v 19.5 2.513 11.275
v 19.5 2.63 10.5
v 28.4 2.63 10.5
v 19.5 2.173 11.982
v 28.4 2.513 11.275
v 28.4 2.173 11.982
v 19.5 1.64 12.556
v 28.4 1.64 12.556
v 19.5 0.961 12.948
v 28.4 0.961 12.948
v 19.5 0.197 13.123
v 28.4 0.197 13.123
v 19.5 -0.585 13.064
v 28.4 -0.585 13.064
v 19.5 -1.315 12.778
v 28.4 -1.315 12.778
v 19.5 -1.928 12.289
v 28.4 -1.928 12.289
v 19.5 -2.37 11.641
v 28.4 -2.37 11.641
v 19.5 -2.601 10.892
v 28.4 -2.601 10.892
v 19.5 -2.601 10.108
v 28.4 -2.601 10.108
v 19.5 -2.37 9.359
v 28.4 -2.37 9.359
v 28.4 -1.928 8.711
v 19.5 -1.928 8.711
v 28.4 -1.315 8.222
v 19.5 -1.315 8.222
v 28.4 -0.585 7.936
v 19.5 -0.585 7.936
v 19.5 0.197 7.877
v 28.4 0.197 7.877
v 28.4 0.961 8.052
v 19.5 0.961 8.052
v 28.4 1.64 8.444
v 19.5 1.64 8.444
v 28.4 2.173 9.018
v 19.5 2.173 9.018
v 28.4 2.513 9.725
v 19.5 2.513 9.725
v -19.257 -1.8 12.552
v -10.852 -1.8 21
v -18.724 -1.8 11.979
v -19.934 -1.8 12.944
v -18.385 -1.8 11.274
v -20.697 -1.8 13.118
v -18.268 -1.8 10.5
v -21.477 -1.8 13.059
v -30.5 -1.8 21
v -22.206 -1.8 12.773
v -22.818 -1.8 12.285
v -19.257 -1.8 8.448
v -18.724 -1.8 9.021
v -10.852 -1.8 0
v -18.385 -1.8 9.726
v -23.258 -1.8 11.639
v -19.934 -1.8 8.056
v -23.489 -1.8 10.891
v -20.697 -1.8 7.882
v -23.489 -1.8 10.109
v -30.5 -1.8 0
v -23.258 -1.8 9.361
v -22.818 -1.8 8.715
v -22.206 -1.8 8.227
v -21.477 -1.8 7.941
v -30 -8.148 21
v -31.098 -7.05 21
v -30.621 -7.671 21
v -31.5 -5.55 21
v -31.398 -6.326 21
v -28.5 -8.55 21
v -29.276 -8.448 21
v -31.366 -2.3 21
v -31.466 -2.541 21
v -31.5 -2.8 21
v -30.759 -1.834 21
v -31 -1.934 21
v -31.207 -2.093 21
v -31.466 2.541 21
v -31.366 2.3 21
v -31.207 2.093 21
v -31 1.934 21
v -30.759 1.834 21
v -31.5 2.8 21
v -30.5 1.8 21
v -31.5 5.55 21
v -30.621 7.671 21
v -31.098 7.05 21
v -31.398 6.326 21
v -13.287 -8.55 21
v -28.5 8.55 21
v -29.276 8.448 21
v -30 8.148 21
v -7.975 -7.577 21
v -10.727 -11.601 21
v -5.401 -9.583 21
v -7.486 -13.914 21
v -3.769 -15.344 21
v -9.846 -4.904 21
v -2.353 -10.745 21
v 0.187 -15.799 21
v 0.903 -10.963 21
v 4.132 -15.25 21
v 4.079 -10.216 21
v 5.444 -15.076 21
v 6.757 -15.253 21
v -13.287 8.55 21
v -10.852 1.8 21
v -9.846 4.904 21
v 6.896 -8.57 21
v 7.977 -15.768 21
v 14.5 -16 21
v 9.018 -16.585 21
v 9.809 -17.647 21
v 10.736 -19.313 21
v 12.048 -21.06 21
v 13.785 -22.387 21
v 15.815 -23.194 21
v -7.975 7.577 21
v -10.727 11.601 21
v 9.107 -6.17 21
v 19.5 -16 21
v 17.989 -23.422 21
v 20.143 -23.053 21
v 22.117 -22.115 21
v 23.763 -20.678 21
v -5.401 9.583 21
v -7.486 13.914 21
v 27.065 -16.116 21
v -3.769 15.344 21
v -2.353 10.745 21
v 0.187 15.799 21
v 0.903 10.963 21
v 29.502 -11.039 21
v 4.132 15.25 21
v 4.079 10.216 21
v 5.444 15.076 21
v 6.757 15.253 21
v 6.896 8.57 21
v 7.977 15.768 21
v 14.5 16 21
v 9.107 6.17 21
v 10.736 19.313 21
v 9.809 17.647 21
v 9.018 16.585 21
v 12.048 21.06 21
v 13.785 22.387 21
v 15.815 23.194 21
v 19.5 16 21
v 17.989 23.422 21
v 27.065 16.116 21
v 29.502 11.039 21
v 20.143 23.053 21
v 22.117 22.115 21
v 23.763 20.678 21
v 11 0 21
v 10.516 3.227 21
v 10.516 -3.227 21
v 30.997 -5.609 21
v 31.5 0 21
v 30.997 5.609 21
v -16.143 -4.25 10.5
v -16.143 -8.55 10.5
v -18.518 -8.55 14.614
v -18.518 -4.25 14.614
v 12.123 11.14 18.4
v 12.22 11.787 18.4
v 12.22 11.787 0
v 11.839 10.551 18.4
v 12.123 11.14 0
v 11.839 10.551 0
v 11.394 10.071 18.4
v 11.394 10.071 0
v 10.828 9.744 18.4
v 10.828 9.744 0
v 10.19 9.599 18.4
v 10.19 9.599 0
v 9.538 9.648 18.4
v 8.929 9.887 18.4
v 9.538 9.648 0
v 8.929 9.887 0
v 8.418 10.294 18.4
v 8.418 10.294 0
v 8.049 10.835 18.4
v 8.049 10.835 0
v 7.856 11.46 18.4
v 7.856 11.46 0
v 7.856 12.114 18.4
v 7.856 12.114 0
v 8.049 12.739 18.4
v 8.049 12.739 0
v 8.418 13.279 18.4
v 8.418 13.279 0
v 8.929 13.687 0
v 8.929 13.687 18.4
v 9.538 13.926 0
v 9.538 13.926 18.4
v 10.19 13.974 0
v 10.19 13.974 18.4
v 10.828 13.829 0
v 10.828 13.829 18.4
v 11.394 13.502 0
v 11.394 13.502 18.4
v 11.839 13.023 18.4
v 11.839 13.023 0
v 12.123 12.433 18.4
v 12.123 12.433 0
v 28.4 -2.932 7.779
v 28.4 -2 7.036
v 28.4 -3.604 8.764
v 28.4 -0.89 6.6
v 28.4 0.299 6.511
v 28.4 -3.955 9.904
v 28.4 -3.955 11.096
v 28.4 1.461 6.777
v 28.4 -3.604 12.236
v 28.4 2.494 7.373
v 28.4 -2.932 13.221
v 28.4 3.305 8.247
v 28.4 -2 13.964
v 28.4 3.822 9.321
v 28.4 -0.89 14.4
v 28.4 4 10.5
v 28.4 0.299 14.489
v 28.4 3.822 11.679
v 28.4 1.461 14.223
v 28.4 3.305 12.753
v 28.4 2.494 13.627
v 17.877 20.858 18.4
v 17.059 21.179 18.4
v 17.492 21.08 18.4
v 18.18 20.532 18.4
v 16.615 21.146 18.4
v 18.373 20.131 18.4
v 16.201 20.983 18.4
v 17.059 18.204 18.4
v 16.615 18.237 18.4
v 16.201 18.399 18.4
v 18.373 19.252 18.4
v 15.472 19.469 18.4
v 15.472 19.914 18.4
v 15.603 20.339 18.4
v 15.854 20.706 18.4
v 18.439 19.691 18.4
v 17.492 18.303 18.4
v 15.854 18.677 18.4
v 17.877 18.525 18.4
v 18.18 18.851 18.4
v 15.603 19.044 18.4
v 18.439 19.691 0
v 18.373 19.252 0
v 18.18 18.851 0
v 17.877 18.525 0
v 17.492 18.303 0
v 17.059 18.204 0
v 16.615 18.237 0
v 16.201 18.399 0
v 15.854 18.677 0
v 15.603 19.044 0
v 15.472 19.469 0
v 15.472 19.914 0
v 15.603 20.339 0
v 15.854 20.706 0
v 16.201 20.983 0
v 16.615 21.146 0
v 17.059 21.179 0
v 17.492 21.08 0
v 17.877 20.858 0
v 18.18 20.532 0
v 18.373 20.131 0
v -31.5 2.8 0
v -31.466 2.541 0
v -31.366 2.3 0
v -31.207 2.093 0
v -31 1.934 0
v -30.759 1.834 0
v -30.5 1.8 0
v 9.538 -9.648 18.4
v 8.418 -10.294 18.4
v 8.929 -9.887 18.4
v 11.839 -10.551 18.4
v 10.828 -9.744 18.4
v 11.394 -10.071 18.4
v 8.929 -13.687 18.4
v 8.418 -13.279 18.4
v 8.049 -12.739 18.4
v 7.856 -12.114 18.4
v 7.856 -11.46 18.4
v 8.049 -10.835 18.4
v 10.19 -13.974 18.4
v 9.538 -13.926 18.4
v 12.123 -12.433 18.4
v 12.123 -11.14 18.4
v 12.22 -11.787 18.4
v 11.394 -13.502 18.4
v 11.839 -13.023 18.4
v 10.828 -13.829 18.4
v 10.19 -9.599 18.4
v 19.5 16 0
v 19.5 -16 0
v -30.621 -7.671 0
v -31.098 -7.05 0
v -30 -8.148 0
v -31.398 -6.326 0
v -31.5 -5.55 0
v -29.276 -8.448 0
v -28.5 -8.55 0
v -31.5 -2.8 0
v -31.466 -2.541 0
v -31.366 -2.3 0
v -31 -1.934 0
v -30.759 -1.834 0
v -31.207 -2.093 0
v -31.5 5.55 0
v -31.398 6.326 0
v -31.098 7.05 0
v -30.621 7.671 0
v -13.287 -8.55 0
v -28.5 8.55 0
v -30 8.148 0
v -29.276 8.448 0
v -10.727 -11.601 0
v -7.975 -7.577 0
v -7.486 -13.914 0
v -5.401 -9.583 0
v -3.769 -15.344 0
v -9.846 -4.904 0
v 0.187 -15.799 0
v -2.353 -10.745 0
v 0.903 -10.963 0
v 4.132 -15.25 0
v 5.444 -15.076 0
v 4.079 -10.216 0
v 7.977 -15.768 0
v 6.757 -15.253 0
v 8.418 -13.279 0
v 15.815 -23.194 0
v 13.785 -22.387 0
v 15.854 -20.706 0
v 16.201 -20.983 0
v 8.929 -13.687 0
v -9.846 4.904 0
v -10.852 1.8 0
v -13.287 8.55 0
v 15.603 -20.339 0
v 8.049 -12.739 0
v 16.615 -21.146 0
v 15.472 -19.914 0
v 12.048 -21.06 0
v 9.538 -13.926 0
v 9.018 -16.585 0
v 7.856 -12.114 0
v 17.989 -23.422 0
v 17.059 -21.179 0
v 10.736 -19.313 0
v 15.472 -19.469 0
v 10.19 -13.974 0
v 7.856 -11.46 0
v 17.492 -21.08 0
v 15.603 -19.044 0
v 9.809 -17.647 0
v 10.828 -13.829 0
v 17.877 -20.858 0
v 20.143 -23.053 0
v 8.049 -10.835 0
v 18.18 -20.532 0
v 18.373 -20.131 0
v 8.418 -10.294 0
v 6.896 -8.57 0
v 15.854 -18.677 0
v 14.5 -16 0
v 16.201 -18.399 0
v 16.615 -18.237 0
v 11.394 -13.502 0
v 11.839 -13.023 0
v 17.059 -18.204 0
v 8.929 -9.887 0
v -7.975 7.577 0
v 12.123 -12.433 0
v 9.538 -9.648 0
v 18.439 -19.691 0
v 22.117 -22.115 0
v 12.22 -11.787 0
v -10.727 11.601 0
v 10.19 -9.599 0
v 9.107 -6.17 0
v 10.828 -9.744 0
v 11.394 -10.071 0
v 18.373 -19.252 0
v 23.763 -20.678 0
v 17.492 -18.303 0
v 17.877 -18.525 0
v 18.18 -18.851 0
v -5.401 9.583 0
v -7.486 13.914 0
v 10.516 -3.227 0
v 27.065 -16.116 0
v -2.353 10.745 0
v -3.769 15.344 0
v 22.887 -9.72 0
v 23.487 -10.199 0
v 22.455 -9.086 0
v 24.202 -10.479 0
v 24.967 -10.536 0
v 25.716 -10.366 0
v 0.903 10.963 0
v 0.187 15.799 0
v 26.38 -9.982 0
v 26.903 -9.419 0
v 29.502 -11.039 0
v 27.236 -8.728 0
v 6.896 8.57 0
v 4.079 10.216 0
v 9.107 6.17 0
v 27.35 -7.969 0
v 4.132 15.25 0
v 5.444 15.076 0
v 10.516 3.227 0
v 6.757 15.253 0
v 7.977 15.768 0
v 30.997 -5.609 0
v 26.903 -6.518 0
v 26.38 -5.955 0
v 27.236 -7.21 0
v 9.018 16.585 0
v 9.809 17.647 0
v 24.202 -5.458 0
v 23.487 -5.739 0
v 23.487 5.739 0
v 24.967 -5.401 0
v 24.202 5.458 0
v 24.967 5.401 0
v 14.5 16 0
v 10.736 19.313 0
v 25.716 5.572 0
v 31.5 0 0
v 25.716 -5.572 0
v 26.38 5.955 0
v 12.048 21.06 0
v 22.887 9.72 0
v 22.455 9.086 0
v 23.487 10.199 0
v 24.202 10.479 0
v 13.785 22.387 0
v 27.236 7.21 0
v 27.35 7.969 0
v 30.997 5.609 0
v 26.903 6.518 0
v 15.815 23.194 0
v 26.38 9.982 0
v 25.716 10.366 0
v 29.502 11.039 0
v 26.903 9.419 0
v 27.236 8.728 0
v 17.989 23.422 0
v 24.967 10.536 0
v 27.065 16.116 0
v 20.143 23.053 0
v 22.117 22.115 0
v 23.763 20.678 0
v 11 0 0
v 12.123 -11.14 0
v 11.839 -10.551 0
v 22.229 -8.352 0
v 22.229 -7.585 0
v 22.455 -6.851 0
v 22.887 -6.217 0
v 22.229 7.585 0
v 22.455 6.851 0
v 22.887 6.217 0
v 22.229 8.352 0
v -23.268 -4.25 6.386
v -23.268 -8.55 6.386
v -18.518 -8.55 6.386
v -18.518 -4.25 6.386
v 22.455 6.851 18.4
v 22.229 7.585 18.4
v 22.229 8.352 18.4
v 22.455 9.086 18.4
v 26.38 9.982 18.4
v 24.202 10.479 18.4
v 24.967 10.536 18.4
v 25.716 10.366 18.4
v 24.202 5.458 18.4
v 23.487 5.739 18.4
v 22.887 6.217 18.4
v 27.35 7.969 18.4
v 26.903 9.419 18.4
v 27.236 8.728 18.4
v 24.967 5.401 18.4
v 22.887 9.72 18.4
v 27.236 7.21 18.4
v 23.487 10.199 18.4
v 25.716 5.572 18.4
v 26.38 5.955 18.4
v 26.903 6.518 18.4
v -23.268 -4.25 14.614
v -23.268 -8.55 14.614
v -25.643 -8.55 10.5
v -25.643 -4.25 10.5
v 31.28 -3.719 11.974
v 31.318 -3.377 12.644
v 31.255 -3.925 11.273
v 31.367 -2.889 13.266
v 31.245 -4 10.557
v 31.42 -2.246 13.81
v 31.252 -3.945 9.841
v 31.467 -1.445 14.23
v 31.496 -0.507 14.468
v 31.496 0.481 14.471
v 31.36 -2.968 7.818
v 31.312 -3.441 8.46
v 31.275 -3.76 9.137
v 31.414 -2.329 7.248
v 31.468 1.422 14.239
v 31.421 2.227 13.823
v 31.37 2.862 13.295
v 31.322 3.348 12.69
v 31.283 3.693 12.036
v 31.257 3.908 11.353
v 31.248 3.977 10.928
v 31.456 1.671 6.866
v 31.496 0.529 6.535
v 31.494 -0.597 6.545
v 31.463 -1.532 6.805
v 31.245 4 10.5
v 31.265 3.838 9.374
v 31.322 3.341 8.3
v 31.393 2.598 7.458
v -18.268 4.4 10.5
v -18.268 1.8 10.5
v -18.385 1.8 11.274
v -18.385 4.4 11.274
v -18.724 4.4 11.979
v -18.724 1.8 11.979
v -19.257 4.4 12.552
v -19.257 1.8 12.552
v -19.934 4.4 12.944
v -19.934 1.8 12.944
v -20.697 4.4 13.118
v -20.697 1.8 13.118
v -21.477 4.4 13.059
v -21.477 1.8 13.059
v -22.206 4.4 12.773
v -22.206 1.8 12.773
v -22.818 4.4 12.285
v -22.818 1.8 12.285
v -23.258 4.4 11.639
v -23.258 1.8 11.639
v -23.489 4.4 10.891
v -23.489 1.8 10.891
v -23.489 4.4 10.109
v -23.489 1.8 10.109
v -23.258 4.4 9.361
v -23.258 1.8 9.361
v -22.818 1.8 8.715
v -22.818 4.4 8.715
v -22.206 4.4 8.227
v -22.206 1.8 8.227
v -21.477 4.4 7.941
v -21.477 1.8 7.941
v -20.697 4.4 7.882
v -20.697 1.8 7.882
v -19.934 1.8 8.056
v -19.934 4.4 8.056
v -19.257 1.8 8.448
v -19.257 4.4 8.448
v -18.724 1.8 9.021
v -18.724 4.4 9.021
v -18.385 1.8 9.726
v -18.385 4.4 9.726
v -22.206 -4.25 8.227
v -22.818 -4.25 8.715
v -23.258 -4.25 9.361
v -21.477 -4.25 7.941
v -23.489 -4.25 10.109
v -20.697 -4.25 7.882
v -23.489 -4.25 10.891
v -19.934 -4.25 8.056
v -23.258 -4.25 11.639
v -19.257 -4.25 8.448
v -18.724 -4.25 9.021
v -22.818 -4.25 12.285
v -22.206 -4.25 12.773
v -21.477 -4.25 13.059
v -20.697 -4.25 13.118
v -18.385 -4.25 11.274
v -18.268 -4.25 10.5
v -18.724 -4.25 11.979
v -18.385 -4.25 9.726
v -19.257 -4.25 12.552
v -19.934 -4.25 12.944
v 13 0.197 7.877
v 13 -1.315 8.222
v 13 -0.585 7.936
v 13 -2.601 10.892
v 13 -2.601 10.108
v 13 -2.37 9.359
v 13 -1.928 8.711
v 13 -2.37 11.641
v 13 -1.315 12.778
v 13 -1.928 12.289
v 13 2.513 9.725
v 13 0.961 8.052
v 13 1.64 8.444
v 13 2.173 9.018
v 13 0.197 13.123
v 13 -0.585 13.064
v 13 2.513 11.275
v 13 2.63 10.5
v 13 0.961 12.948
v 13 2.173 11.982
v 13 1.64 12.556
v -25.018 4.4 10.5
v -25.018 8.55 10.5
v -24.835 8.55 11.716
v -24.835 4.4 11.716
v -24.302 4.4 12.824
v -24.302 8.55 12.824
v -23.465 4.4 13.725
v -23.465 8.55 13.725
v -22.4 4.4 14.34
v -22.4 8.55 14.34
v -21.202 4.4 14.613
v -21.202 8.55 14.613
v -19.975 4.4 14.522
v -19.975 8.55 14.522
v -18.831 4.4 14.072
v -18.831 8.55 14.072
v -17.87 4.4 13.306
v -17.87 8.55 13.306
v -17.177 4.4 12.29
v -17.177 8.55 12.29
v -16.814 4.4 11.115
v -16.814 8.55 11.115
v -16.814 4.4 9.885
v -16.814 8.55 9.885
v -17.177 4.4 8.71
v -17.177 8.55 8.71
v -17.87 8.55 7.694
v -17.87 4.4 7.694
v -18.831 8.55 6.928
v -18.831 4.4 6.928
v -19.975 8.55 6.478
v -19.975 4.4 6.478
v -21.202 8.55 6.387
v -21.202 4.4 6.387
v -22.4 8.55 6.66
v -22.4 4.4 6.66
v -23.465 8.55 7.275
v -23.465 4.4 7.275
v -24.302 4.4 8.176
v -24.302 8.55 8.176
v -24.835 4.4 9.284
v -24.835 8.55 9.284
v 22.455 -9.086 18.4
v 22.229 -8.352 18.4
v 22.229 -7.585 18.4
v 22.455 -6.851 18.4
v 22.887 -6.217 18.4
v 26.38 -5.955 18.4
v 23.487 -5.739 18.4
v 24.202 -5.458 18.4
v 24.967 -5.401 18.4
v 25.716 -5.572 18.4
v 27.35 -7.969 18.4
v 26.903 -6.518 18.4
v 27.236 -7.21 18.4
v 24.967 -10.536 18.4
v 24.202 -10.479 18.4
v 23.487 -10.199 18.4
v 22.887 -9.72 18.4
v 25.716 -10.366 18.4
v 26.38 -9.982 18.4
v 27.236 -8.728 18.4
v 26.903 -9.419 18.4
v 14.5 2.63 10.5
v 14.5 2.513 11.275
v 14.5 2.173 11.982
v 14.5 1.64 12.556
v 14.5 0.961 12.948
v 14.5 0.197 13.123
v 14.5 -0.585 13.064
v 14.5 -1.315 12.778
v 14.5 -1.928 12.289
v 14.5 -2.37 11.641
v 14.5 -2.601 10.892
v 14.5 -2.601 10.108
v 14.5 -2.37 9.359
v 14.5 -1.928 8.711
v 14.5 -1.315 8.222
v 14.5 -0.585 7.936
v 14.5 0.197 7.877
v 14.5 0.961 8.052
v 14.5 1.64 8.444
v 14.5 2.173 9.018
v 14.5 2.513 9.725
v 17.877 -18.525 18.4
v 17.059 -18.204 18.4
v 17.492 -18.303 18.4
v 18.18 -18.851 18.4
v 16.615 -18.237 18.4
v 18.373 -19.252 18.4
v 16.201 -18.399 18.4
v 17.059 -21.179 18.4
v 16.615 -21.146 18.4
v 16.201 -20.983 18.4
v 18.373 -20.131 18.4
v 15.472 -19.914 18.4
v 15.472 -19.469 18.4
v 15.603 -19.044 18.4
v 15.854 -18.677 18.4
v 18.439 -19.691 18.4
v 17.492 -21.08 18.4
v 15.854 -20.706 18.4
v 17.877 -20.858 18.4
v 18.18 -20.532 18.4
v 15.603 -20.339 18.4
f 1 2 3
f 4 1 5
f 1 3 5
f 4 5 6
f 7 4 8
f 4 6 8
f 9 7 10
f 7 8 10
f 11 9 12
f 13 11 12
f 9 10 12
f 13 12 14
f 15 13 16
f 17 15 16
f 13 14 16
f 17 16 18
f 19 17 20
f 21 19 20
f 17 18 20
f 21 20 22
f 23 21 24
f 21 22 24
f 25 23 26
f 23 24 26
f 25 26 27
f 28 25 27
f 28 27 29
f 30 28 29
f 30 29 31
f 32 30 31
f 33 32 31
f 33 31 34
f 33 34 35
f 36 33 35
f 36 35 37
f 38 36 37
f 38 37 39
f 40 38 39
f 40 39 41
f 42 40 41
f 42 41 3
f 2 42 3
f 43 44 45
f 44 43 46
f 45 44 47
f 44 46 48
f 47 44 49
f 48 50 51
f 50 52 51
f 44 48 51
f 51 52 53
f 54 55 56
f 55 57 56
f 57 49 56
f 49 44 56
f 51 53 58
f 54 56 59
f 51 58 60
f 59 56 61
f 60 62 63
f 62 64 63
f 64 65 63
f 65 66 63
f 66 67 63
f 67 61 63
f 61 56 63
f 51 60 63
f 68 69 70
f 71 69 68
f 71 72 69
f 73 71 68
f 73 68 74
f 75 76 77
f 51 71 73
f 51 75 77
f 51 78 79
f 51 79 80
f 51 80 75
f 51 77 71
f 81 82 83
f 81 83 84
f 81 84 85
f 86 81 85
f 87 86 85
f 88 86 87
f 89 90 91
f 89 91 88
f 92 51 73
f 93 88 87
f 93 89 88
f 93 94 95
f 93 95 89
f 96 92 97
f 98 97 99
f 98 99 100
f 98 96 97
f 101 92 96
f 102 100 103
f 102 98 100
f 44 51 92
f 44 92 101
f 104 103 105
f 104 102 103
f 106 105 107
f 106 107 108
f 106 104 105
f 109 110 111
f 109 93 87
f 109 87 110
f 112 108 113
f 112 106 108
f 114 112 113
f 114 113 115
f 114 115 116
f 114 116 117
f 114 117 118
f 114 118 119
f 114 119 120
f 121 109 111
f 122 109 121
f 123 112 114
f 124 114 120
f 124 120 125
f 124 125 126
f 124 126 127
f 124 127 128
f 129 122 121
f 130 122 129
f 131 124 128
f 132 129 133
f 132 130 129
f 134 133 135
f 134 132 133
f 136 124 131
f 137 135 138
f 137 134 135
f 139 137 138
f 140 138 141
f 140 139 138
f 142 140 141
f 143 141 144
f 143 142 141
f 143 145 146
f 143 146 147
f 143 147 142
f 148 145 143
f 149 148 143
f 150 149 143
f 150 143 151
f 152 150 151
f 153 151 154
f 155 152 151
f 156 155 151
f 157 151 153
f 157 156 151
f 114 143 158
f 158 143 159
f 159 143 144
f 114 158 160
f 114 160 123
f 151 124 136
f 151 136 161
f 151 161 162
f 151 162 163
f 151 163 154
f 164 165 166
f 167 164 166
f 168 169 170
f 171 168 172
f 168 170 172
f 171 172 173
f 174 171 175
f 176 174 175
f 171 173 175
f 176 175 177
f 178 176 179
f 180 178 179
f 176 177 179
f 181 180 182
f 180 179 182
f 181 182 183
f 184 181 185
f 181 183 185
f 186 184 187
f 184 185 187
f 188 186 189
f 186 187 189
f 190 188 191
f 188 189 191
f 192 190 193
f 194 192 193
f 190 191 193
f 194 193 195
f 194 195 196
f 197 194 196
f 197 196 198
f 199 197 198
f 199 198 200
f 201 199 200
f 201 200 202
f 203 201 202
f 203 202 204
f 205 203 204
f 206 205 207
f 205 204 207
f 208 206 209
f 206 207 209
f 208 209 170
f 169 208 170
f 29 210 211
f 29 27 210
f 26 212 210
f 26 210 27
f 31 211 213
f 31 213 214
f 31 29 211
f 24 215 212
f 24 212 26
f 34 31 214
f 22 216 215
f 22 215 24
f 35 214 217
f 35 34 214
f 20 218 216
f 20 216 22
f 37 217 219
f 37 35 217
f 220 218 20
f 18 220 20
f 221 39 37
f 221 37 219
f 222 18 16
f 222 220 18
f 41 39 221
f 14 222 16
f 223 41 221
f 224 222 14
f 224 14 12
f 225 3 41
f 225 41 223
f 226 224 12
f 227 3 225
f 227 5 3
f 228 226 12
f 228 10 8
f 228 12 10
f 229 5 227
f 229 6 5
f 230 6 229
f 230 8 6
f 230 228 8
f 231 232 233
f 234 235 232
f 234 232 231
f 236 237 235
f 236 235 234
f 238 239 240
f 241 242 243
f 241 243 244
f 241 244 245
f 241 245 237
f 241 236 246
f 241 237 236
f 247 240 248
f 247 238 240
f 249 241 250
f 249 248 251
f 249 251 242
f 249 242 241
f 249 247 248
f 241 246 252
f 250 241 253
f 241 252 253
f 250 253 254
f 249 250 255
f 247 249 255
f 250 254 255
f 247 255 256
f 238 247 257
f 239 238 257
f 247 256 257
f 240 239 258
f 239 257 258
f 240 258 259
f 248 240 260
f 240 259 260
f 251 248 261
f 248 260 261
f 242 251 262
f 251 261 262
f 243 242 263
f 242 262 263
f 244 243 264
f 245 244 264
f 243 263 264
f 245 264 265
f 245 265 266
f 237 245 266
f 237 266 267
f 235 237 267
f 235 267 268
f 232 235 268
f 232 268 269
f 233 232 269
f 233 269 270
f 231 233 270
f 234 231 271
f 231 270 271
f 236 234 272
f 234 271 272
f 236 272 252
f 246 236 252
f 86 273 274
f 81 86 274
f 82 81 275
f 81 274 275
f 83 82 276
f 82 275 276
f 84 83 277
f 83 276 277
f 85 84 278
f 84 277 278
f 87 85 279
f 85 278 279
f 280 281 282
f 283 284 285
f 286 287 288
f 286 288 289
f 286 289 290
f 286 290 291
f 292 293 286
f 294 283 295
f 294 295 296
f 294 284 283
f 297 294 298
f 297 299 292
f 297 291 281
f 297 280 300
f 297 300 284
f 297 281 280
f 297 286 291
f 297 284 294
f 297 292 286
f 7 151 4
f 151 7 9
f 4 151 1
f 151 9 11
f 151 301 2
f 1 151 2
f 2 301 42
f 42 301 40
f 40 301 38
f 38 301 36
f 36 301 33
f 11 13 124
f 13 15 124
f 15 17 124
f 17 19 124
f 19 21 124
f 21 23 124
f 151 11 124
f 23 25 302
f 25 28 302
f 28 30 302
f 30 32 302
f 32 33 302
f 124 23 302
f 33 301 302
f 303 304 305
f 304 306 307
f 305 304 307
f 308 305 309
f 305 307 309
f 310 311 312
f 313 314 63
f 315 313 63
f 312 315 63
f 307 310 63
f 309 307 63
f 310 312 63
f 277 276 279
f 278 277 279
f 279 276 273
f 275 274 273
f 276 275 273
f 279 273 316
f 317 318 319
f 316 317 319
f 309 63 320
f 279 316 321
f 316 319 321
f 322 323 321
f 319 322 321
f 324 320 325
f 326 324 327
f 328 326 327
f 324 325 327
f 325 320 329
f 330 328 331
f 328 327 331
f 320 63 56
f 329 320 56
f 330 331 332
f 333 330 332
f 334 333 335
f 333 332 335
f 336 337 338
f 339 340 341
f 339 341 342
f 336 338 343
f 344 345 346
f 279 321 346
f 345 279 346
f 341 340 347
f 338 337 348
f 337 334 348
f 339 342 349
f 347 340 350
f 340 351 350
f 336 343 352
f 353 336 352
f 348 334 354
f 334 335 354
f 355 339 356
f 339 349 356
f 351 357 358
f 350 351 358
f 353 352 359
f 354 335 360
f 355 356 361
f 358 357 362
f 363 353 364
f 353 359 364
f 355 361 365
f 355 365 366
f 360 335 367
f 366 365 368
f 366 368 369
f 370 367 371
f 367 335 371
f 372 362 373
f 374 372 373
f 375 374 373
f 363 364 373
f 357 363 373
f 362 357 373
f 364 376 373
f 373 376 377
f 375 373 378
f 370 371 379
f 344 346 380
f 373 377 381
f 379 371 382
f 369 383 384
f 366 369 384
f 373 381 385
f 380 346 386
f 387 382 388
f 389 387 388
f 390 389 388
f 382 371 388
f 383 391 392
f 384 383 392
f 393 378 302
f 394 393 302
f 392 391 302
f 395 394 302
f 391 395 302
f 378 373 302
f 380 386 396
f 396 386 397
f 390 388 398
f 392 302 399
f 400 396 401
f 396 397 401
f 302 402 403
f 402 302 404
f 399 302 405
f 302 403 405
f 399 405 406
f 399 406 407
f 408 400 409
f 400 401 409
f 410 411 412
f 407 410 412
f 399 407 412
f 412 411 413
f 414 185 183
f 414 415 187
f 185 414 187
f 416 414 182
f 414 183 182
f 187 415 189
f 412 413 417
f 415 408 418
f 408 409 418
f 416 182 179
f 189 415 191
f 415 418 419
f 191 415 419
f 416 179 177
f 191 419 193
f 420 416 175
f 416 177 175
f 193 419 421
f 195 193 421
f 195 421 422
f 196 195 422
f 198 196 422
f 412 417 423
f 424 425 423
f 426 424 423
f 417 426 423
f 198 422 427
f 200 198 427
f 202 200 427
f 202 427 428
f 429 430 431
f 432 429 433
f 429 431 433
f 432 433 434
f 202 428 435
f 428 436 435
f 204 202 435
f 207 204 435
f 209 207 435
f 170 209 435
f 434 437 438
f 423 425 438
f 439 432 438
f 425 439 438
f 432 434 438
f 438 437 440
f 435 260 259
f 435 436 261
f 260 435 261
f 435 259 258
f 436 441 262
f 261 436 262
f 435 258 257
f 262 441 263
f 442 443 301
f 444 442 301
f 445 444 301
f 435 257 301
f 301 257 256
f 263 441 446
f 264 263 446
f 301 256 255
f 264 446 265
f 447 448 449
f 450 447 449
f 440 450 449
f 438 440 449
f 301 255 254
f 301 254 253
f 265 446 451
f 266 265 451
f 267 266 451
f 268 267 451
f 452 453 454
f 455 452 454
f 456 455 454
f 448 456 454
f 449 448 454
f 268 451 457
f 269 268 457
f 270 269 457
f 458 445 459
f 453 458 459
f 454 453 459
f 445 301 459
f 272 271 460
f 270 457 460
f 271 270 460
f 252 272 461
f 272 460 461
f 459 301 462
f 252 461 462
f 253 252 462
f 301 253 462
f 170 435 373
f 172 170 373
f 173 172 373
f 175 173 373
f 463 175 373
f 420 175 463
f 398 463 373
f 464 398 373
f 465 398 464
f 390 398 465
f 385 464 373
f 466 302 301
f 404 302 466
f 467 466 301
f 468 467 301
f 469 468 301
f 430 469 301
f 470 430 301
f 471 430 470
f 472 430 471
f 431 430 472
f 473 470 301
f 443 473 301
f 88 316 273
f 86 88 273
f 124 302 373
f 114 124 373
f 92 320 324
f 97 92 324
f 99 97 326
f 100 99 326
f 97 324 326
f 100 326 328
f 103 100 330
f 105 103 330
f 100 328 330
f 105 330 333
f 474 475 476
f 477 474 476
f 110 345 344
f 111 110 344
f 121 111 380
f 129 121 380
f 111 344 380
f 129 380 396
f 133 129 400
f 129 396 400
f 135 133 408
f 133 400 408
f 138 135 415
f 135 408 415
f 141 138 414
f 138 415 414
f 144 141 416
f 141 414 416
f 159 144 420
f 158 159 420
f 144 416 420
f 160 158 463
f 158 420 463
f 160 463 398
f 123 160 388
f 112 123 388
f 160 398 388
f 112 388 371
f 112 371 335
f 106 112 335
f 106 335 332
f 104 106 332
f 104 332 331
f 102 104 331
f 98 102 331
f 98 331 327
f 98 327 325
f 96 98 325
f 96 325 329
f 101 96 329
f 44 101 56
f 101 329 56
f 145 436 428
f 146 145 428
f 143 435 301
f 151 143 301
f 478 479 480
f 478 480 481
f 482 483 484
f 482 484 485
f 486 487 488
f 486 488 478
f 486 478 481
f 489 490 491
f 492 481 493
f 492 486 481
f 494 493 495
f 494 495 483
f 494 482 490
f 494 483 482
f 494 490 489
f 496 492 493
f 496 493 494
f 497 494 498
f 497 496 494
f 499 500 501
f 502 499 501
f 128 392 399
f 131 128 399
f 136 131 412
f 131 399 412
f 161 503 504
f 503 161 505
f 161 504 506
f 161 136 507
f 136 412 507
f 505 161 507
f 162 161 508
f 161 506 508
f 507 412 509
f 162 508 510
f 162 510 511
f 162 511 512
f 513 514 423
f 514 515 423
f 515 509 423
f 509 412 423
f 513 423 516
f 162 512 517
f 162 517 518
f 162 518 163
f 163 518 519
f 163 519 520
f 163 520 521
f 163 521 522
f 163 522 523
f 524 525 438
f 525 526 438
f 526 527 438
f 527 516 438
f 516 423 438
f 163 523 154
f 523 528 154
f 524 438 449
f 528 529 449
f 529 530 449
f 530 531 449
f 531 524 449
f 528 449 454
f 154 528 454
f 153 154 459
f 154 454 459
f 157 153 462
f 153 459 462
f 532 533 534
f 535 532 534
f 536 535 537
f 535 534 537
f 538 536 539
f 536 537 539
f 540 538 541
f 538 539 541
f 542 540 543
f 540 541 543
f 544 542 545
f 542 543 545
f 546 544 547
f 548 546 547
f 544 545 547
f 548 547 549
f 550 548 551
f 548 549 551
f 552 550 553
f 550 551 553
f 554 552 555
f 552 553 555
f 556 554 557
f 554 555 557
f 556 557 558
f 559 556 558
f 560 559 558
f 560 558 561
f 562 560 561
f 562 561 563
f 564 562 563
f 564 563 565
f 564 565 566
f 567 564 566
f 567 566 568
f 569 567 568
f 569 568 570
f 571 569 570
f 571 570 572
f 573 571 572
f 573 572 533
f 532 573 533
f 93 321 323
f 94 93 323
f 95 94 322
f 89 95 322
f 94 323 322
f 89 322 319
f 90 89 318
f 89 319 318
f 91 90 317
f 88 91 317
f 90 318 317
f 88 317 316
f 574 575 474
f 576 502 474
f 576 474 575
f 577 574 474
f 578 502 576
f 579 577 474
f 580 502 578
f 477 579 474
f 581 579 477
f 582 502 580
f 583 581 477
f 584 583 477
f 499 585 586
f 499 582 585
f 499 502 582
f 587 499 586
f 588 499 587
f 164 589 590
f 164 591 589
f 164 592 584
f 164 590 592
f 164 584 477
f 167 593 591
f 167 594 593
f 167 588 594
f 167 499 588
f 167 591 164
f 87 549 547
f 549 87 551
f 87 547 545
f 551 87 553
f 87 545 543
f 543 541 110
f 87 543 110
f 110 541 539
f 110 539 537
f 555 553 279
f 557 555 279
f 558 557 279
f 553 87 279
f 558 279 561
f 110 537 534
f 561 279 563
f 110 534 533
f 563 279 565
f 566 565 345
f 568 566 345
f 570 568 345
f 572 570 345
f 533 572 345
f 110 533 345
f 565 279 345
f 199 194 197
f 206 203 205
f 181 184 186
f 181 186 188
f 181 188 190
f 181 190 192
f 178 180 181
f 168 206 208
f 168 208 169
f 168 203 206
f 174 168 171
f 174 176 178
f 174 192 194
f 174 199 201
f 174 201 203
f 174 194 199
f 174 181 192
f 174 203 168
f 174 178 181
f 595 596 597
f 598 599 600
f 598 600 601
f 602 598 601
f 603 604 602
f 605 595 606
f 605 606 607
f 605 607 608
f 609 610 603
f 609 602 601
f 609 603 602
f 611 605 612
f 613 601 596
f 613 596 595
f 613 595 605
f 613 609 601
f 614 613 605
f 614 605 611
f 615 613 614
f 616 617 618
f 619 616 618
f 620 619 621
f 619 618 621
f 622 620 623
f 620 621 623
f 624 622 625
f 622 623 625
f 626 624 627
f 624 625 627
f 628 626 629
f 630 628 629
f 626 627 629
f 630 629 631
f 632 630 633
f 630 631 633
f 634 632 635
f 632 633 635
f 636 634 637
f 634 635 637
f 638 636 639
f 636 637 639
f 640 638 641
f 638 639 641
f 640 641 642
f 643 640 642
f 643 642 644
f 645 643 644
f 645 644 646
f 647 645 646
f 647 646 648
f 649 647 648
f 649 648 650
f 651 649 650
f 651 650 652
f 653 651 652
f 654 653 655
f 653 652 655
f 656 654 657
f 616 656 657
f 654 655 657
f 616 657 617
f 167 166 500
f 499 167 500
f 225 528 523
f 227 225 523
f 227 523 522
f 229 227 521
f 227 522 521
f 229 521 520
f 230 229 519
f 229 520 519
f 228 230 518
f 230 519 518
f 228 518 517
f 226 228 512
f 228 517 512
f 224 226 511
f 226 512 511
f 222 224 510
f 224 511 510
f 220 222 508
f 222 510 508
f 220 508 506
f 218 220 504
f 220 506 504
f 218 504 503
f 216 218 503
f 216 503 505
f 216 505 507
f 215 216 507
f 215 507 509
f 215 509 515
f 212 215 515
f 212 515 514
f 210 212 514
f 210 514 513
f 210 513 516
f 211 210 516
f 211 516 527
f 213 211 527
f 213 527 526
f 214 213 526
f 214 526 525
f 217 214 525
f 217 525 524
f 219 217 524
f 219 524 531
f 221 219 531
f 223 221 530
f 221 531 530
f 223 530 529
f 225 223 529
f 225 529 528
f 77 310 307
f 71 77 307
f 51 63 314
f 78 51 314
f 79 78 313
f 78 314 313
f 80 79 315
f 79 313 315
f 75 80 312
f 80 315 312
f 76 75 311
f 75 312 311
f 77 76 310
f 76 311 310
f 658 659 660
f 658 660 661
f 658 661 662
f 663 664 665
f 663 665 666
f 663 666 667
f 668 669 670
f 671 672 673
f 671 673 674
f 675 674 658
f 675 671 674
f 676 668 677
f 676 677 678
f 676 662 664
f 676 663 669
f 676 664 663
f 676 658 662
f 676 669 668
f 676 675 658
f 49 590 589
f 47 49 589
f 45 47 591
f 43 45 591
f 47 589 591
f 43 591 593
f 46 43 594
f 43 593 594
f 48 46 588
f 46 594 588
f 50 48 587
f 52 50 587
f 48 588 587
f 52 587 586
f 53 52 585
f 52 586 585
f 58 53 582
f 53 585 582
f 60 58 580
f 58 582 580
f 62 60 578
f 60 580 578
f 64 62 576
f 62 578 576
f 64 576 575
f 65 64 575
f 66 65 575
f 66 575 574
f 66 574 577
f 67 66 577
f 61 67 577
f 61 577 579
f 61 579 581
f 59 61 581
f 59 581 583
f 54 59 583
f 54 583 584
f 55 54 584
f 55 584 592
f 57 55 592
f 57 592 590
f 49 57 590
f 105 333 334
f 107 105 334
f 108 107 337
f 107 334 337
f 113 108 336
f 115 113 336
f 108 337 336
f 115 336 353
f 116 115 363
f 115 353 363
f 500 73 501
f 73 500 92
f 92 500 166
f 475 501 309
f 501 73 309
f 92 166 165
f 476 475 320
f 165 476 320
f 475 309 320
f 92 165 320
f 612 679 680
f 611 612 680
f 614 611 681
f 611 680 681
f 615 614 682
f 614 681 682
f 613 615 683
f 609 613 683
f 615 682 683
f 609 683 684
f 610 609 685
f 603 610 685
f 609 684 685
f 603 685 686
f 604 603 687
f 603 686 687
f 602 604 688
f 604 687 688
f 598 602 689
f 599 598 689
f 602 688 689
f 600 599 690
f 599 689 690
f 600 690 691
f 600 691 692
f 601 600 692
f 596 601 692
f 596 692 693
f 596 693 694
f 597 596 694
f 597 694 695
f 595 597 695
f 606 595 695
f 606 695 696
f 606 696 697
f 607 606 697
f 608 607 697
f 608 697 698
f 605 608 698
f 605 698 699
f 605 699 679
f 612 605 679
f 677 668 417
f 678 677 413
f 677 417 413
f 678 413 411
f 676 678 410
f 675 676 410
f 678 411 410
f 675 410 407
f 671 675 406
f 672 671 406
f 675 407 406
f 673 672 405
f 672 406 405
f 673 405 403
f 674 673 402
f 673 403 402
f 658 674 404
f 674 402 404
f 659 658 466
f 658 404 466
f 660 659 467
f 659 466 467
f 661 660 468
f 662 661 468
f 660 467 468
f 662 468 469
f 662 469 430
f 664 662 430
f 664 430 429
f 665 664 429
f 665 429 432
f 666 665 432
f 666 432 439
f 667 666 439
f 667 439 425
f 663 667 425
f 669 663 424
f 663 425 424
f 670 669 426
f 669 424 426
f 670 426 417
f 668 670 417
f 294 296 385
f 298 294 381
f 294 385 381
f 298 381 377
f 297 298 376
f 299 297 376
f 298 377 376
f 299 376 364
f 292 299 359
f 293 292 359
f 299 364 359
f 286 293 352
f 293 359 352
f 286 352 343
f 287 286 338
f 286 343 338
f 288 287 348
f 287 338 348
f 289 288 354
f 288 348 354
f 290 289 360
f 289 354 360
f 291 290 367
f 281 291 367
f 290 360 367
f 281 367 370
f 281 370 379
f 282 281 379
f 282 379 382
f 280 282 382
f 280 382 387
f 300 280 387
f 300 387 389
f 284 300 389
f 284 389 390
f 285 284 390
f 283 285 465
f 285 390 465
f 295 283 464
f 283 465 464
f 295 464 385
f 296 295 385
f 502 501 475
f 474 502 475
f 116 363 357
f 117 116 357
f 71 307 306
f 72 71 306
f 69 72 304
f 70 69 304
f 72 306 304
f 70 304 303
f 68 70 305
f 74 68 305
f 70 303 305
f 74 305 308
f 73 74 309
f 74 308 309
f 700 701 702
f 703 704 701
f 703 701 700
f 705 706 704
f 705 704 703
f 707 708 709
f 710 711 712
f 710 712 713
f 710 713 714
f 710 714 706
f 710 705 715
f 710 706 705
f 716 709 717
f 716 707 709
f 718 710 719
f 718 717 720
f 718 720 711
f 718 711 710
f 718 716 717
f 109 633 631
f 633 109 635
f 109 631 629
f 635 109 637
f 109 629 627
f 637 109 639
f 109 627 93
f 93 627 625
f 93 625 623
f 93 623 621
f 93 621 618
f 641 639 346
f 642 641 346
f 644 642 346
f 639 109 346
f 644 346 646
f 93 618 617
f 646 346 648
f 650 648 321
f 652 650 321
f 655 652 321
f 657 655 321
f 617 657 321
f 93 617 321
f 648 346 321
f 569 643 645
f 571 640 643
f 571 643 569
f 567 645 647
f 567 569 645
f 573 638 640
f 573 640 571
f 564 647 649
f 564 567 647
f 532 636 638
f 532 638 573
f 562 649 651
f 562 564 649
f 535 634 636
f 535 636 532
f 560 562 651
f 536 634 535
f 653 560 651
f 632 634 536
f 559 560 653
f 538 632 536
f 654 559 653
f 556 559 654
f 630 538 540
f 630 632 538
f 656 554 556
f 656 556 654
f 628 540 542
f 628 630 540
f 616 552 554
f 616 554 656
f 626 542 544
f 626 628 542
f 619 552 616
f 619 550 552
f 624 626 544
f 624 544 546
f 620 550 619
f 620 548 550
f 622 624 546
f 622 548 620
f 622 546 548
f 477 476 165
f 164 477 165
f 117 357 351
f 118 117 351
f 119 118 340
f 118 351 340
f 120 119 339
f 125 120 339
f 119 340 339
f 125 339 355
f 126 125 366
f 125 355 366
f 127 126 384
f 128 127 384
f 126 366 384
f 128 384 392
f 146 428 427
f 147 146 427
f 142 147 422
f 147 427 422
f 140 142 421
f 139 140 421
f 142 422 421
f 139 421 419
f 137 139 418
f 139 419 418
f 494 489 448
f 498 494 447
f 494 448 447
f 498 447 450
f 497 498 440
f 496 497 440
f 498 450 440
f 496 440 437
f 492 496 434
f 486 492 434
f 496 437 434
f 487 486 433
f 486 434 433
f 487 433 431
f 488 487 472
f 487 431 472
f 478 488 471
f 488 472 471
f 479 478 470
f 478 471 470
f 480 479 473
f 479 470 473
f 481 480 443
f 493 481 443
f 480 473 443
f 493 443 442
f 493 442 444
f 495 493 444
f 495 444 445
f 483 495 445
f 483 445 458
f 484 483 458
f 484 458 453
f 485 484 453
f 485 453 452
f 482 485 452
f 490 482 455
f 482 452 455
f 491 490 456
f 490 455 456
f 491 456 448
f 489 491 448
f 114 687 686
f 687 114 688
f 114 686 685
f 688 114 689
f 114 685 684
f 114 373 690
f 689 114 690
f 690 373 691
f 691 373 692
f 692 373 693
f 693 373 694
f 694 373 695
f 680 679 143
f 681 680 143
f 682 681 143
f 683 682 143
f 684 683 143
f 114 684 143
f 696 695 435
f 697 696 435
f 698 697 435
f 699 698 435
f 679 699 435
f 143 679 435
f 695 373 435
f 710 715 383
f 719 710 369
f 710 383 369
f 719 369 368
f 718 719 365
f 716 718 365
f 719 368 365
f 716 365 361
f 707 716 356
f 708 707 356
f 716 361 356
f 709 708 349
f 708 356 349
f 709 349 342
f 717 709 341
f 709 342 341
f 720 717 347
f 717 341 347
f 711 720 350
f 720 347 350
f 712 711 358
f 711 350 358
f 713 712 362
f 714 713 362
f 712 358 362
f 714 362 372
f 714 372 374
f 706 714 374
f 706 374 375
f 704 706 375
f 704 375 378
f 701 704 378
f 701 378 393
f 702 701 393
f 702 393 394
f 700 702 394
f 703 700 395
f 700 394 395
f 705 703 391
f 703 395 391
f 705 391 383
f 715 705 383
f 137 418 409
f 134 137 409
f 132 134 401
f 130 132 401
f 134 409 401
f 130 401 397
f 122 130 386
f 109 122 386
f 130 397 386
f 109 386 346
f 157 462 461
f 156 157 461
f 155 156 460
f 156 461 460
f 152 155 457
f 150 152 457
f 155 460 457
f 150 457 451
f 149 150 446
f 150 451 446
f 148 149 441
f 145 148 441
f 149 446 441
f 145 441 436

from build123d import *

# Parameters (mm, degrees)
F1_DEPTH  = 21
F3_DEPTH  = 4.3
F4_R      = 2.625
F5_DEPTH  = 27.677358
F6_R      = 4.125
F7_DEPTH  = 4.15
F9_R      = 4
F10_DEPTH = 3.1
F11_R     = 2.63
F12_DEPTH = 15.4
F13_R     = 2.194009
F13_R_2   = 2.575
F13_R_3   = 1.491787
F14_DEPTH = 18.4


with BuildPart() as f1:
    # F0 (on Top) → F1 (new body)
    with BuildSketch(Plane.XY):
        with BuildLine():
            ThreePointArc((-10.851728, 1.8), (11, 0), (-10.851728, -1.8))
            Line((-10.851728, -1.8), (-15.697133, -1.8))
            ThreePointArc((-15.697133, -1.8), (-14.879747, -5.313485), (-13.286742, -8.55))
            ThreePointArc((-13.286742, -8.55), (-5.672485, -14.746624), (4.131669, -15.250223))
            ThreePointArc((4.131669, -15.250223), (7.383686, -15.469855), (9.809368, -17.646991))
            Line((9.809368, -17.646991), (10.735537, -19.313162))
            ThreePointArc((10.735537, -19.313162), (16.894368, -23.382819), (23.762893, -20.677885))
            ThreePointArc((23.762893, -20.677885), (31.5, 0), (23.762893, 20.677885))
            ThreePointArc((23.762893, 20.677885), (16.894368, 23.382819), (10.735537, 19.313162))
            Line((10.735537, 19.313162), (9.809368, 17.646991))
            ThreePointArc((9.809368, 17.646991), (7.383686, 15.469855), (4.131669, 15.250223))
            ThreePointArc((4.131669, 15.250223), (-5.672485, 14.746624), (-13.286742, 8.55))
            ThreePointArc((-13.286742, 8.55), (-14.879747, 5.313485), (-15.697133, 1.8))
            Line((-15.697133, 1.8), (-10.851728, 1.8))
        make_face()
        Polygon((14.5, -16), (14.5, 0), (14.5, 16), (19.5, 16), (19.5, -16), align=None, mode=Mode.SUBTRACT)
        with BuildLine():
            ThreePointArc((-13.286742, -8.55), (-14.879747, -5.313485), (-15.697133, -1.8))
            Line((-15.697133, -1.8), (-30.5, -1.8))
            ThreePointArc((-30.5, -1.8), (-31.207107, -2.092893), (-31.5, -2.8))
            Line((-31.5, -2.8), (-31.5, -5.55))
            ThreePointArc((-31.5, -5.55), (-30.62132, -7.67132), (-28.5, -8.55))
            Line((-28.5, -8.55), (-13.286742, -8.55))
        make_face()
        with BuildLine():
            Line((-30.5, 1.8), (-15.697133, 1.8))
            ThreePointArc((-15.697133, 1.8), (-14.879747, 5.313485), (-13.286742, 8.55))
            Line((-13.286742, 8.55), (-28.5, 8.55))
            ThreePointArc((-28.5, 8.55), (-30.62132, 7.67132), (-31.5, 5.55))
            Line((-31.5, 5.55), (-31.5, 2.8))
            ThreePointArc((-31.5, 2.8), (-31.207107, 2.092893), (-30.5, 1.8))
        make_face()
    extrude(amount=F1_DEPTH)

    # F2 (on face) → F3 (cut)
    with BuildSketch(Plane.XZ.offset(8.55)):
        Polygon((-23.268371, 14.613621), (-25.643371, 10.5), (-23.268371, 6.386379), (-18.518371, 6.386379), (-16.143371, 10.5), (-18.518371, 14.613621), align=None)
    extrude(amount=-F3_DEPTH, mode=Mode.SUBTRACT)

    # F4 (on face) → F5 (cut, through all)
    with BuildSketch(Plane.XZ.offset(4.25)):
        with Locations((-20.893371, 10.5)):
            Circle(F4_R)
    extrude(amount=-F5_DEPTH, mode=Mode.SUBTRACT)

    # F6 (on face) → F7 (cut)
    with BuildSketch(Plane(origin=(0, 8.55, 0), x_dir=(-1, 0, 0), z_dir=(0, 1, 0))):
        with Locations((20.893371, 10.5)):
            Circle(F6_R)
    extrude(amount=-F7_DEPTH, mode=Mode.SUBTRACT)

    # F9 (on offset) → F10 (cut)
    with BuildSketch(Plane.YZ.offset(31.5)):
        with Locations((0, 10.5)):
            Circle(F9_R)
    extrude(amount=-F10_DEPTH, mode=Mode.SUBTRACT)

    # F11 (on face) → F12 (cut)
    with BuildSketch(Plane.YZ.offset(28.4)):
        with Locations((0, 10.5)):
            Circle(F11_R)
    extrude(amount=-F12_DEPTH, mode=Mode.SUBTRACT)

    # F13 (on face) → F14 (cut)
    with BuildSketch(Plane(origin=(0, 0, 0), x_dir=(1, 0, 0), z_dir=(0, 0, -1))):
        with Locations((10.025991, 11.786622)):
            Circle(F13_R)
        with Locations((10.025991, -11.786622)):
            Circle(F13_R)
        with Locations((24.775, 7.968689)):
            Circle(F13_R_2)
        with Locations((24.775, -7.968689)):
            Circle(F13_R_2)
        with Locations((16.947184, 19.69141)):
            Circle(F13_R_3)
        with Locations((16.947184, -19.69141)):
            Circle(F13_R_3)
    extrude(amount=-F14_DEPTH, mode=Mode.SUBTRACT)


solid = f1.part
